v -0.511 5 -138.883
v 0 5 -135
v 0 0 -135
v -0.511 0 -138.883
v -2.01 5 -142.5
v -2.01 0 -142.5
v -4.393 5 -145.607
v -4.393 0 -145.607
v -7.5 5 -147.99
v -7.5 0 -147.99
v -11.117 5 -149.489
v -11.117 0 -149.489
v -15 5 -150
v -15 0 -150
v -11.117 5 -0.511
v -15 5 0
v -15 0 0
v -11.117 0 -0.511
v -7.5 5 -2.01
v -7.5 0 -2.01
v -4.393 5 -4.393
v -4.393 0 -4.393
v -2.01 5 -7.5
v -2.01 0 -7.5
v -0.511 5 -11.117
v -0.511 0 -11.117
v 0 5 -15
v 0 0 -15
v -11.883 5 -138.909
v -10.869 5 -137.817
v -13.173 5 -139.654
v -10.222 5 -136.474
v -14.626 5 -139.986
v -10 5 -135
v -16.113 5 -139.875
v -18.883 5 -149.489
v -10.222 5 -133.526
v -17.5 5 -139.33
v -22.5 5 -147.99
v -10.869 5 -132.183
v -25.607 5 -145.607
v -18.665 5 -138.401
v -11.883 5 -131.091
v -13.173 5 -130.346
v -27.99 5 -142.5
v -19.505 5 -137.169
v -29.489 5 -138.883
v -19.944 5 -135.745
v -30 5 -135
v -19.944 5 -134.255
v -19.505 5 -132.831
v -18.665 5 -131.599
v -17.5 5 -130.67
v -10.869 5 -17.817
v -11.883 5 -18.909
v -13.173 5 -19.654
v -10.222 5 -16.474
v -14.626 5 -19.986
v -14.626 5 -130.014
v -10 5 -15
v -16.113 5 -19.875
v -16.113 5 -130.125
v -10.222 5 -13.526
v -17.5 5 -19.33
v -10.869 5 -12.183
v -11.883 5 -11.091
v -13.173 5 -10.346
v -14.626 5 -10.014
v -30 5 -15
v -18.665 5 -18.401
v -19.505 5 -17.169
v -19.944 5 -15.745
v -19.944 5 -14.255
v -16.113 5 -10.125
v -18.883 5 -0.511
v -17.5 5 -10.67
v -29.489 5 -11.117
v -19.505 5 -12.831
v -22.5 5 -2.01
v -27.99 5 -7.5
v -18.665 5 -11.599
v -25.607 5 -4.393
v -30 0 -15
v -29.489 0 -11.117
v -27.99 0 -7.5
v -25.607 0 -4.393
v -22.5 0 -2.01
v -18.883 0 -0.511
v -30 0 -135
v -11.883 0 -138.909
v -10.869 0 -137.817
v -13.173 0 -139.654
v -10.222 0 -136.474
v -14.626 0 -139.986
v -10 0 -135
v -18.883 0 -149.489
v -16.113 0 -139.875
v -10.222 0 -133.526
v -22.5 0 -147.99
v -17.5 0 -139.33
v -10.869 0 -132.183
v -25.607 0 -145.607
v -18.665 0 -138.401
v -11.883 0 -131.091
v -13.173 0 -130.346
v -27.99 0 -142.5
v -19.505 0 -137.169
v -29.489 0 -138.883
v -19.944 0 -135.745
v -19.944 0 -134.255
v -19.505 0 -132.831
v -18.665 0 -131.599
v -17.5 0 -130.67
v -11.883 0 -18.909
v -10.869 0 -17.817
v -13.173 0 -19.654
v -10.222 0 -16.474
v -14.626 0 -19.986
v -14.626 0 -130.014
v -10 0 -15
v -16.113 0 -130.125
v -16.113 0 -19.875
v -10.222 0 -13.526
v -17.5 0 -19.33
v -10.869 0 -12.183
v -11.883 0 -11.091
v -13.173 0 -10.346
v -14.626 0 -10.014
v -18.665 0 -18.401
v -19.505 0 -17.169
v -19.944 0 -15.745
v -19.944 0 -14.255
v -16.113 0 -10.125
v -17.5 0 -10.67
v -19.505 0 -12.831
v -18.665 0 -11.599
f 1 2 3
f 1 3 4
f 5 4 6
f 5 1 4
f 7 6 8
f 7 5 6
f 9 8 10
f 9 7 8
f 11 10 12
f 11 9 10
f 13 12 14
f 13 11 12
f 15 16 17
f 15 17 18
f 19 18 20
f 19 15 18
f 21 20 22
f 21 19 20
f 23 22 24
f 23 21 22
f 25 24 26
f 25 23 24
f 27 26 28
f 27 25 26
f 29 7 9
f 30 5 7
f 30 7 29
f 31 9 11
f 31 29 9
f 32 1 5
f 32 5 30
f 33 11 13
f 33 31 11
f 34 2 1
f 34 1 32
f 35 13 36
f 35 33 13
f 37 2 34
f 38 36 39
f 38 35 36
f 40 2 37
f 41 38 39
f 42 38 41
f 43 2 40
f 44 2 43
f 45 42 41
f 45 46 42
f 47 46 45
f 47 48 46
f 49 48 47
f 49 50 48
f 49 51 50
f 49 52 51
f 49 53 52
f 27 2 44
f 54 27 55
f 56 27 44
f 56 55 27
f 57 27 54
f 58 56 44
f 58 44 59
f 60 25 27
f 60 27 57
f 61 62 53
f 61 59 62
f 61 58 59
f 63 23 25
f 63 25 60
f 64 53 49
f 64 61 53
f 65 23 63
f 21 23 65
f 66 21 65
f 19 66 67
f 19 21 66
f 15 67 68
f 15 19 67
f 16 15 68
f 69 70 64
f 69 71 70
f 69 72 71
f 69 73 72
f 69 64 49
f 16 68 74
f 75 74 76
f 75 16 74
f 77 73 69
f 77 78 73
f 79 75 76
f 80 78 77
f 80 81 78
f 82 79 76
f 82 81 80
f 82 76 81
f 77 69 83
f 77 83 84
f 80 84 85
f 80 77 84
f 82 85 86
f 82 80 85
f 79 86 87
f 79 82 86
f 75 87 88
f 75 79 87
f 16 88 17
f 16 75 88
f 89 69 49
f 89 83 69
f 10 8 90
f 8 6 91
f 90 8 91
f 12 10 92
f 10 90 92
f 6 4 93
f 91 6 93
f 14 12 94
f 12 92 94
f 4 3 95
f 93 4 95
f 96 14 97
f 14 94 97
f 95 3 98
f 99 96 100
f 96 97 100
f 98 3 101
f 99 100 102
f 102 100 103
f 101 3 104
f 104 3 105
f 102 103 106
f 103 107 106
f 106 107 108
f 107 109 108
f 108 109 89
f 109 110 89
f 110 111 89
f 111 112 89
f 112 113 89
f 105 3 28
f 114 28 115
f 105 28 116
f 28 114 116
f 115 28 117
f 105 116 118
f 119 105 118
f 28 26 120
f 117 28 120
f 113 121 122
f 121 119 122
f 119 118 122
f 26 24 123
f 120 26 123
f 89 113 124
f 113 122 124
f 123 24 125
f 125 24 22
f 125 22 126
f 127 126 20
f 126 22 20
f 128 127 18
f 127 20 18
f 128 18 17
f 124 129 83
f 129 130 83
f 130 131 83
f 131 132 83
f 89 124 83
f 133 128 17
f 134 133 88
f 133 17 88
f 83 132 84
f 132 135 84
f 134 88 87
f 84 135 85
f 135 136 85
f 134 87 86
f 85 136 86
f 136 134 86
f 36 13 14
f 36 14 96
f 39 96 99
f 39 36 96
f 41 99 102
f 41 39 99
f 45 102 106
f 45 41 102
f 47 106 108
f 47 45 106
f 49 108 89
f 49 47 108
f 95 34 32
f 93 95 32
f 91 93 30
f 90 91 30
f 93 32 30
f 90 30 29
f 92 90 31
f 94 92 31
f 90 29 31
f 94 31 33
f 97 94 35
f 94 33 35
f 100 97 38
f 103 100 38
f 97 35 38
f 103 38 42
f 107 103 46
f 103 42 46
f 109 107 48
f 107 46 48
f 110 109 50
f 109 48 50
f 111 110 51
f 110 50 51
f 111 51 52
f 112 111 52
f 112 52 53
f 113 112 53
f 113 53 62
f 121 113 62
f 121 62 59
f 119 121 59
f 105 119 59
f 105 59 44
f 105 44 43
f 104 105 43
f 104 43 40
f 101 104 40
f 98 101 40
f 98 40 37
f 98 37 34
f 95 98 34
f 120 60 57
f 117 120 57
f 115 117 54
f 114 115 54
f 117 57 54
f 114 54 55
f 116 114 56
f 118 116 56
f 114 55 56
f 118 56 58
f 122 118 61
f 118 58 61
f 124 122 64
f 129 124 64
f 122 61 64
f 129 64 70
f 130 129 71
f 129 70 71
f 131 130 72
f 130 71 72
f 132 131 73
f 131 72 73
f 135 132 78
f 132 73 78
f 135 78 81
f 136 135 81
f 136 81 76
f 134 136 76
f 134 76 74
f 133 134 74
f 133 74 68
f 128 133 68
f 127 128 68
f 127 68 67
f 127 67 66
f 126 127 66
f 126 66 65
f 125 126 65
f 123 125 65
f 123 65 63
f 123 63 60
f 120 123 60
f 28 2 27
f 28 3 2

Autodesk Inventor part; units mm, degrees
ref_plane "YZ Plane" through (0, 0, 0) normal (1, 0, 0) x (0, 1, 0)
ref_plane "XZ Plane" through (0, 0, 0) normal (0, 1, 0) x (-1, 0, 0)
ref_plane "XY Plane" through (0, 0, 0) normal (0, 0, 1) x (1, 0, 0)
sketch "Sketch1" plane through (0, 0, 0) normal (0, 1, 0) x (-1, 0, 0)
  line L0 (0, 0) -> (30, 0)
  line L1 (30, 0) -> (30, -150)
  line L2 (30, -150) -> (0, -150)
  line L3 (0, -150) -> (0, 0)
  dimension "d0" = 30
  dimension "d1" = 150
extrude "Extrusion1" add sketch "Sketch1" along normal blind 5
fillet "Fillet1" radius 15 4 edges at (0, 2.5, 0) (-30, 2.5, 0) (0, 2.5, -150) (-30, 2.5, -150)
sketch "Sketch2" plane through (0, 5, 0) normal (0, 1, 0) x (1, 0, 0)
  arc A0 (0, 135) -> (-30, 135) centre (-15, 135) ccw projected
  circle A1 centre (-15, 135) radius 5
  arc A2 (-30, 15) -> (0, 15) centre (-15, 15) ccw projected
  circle A3 centre (-15, 15) radius 5
  point P0 (0, 0)
  dimension "d5" = 10
  dimension "d6" = 10
extrude "Extrusion2" cut sketch "Sketch2" against normal blind 10
equation "\"d7\" = d6"
properties part number "Coupler Link"
